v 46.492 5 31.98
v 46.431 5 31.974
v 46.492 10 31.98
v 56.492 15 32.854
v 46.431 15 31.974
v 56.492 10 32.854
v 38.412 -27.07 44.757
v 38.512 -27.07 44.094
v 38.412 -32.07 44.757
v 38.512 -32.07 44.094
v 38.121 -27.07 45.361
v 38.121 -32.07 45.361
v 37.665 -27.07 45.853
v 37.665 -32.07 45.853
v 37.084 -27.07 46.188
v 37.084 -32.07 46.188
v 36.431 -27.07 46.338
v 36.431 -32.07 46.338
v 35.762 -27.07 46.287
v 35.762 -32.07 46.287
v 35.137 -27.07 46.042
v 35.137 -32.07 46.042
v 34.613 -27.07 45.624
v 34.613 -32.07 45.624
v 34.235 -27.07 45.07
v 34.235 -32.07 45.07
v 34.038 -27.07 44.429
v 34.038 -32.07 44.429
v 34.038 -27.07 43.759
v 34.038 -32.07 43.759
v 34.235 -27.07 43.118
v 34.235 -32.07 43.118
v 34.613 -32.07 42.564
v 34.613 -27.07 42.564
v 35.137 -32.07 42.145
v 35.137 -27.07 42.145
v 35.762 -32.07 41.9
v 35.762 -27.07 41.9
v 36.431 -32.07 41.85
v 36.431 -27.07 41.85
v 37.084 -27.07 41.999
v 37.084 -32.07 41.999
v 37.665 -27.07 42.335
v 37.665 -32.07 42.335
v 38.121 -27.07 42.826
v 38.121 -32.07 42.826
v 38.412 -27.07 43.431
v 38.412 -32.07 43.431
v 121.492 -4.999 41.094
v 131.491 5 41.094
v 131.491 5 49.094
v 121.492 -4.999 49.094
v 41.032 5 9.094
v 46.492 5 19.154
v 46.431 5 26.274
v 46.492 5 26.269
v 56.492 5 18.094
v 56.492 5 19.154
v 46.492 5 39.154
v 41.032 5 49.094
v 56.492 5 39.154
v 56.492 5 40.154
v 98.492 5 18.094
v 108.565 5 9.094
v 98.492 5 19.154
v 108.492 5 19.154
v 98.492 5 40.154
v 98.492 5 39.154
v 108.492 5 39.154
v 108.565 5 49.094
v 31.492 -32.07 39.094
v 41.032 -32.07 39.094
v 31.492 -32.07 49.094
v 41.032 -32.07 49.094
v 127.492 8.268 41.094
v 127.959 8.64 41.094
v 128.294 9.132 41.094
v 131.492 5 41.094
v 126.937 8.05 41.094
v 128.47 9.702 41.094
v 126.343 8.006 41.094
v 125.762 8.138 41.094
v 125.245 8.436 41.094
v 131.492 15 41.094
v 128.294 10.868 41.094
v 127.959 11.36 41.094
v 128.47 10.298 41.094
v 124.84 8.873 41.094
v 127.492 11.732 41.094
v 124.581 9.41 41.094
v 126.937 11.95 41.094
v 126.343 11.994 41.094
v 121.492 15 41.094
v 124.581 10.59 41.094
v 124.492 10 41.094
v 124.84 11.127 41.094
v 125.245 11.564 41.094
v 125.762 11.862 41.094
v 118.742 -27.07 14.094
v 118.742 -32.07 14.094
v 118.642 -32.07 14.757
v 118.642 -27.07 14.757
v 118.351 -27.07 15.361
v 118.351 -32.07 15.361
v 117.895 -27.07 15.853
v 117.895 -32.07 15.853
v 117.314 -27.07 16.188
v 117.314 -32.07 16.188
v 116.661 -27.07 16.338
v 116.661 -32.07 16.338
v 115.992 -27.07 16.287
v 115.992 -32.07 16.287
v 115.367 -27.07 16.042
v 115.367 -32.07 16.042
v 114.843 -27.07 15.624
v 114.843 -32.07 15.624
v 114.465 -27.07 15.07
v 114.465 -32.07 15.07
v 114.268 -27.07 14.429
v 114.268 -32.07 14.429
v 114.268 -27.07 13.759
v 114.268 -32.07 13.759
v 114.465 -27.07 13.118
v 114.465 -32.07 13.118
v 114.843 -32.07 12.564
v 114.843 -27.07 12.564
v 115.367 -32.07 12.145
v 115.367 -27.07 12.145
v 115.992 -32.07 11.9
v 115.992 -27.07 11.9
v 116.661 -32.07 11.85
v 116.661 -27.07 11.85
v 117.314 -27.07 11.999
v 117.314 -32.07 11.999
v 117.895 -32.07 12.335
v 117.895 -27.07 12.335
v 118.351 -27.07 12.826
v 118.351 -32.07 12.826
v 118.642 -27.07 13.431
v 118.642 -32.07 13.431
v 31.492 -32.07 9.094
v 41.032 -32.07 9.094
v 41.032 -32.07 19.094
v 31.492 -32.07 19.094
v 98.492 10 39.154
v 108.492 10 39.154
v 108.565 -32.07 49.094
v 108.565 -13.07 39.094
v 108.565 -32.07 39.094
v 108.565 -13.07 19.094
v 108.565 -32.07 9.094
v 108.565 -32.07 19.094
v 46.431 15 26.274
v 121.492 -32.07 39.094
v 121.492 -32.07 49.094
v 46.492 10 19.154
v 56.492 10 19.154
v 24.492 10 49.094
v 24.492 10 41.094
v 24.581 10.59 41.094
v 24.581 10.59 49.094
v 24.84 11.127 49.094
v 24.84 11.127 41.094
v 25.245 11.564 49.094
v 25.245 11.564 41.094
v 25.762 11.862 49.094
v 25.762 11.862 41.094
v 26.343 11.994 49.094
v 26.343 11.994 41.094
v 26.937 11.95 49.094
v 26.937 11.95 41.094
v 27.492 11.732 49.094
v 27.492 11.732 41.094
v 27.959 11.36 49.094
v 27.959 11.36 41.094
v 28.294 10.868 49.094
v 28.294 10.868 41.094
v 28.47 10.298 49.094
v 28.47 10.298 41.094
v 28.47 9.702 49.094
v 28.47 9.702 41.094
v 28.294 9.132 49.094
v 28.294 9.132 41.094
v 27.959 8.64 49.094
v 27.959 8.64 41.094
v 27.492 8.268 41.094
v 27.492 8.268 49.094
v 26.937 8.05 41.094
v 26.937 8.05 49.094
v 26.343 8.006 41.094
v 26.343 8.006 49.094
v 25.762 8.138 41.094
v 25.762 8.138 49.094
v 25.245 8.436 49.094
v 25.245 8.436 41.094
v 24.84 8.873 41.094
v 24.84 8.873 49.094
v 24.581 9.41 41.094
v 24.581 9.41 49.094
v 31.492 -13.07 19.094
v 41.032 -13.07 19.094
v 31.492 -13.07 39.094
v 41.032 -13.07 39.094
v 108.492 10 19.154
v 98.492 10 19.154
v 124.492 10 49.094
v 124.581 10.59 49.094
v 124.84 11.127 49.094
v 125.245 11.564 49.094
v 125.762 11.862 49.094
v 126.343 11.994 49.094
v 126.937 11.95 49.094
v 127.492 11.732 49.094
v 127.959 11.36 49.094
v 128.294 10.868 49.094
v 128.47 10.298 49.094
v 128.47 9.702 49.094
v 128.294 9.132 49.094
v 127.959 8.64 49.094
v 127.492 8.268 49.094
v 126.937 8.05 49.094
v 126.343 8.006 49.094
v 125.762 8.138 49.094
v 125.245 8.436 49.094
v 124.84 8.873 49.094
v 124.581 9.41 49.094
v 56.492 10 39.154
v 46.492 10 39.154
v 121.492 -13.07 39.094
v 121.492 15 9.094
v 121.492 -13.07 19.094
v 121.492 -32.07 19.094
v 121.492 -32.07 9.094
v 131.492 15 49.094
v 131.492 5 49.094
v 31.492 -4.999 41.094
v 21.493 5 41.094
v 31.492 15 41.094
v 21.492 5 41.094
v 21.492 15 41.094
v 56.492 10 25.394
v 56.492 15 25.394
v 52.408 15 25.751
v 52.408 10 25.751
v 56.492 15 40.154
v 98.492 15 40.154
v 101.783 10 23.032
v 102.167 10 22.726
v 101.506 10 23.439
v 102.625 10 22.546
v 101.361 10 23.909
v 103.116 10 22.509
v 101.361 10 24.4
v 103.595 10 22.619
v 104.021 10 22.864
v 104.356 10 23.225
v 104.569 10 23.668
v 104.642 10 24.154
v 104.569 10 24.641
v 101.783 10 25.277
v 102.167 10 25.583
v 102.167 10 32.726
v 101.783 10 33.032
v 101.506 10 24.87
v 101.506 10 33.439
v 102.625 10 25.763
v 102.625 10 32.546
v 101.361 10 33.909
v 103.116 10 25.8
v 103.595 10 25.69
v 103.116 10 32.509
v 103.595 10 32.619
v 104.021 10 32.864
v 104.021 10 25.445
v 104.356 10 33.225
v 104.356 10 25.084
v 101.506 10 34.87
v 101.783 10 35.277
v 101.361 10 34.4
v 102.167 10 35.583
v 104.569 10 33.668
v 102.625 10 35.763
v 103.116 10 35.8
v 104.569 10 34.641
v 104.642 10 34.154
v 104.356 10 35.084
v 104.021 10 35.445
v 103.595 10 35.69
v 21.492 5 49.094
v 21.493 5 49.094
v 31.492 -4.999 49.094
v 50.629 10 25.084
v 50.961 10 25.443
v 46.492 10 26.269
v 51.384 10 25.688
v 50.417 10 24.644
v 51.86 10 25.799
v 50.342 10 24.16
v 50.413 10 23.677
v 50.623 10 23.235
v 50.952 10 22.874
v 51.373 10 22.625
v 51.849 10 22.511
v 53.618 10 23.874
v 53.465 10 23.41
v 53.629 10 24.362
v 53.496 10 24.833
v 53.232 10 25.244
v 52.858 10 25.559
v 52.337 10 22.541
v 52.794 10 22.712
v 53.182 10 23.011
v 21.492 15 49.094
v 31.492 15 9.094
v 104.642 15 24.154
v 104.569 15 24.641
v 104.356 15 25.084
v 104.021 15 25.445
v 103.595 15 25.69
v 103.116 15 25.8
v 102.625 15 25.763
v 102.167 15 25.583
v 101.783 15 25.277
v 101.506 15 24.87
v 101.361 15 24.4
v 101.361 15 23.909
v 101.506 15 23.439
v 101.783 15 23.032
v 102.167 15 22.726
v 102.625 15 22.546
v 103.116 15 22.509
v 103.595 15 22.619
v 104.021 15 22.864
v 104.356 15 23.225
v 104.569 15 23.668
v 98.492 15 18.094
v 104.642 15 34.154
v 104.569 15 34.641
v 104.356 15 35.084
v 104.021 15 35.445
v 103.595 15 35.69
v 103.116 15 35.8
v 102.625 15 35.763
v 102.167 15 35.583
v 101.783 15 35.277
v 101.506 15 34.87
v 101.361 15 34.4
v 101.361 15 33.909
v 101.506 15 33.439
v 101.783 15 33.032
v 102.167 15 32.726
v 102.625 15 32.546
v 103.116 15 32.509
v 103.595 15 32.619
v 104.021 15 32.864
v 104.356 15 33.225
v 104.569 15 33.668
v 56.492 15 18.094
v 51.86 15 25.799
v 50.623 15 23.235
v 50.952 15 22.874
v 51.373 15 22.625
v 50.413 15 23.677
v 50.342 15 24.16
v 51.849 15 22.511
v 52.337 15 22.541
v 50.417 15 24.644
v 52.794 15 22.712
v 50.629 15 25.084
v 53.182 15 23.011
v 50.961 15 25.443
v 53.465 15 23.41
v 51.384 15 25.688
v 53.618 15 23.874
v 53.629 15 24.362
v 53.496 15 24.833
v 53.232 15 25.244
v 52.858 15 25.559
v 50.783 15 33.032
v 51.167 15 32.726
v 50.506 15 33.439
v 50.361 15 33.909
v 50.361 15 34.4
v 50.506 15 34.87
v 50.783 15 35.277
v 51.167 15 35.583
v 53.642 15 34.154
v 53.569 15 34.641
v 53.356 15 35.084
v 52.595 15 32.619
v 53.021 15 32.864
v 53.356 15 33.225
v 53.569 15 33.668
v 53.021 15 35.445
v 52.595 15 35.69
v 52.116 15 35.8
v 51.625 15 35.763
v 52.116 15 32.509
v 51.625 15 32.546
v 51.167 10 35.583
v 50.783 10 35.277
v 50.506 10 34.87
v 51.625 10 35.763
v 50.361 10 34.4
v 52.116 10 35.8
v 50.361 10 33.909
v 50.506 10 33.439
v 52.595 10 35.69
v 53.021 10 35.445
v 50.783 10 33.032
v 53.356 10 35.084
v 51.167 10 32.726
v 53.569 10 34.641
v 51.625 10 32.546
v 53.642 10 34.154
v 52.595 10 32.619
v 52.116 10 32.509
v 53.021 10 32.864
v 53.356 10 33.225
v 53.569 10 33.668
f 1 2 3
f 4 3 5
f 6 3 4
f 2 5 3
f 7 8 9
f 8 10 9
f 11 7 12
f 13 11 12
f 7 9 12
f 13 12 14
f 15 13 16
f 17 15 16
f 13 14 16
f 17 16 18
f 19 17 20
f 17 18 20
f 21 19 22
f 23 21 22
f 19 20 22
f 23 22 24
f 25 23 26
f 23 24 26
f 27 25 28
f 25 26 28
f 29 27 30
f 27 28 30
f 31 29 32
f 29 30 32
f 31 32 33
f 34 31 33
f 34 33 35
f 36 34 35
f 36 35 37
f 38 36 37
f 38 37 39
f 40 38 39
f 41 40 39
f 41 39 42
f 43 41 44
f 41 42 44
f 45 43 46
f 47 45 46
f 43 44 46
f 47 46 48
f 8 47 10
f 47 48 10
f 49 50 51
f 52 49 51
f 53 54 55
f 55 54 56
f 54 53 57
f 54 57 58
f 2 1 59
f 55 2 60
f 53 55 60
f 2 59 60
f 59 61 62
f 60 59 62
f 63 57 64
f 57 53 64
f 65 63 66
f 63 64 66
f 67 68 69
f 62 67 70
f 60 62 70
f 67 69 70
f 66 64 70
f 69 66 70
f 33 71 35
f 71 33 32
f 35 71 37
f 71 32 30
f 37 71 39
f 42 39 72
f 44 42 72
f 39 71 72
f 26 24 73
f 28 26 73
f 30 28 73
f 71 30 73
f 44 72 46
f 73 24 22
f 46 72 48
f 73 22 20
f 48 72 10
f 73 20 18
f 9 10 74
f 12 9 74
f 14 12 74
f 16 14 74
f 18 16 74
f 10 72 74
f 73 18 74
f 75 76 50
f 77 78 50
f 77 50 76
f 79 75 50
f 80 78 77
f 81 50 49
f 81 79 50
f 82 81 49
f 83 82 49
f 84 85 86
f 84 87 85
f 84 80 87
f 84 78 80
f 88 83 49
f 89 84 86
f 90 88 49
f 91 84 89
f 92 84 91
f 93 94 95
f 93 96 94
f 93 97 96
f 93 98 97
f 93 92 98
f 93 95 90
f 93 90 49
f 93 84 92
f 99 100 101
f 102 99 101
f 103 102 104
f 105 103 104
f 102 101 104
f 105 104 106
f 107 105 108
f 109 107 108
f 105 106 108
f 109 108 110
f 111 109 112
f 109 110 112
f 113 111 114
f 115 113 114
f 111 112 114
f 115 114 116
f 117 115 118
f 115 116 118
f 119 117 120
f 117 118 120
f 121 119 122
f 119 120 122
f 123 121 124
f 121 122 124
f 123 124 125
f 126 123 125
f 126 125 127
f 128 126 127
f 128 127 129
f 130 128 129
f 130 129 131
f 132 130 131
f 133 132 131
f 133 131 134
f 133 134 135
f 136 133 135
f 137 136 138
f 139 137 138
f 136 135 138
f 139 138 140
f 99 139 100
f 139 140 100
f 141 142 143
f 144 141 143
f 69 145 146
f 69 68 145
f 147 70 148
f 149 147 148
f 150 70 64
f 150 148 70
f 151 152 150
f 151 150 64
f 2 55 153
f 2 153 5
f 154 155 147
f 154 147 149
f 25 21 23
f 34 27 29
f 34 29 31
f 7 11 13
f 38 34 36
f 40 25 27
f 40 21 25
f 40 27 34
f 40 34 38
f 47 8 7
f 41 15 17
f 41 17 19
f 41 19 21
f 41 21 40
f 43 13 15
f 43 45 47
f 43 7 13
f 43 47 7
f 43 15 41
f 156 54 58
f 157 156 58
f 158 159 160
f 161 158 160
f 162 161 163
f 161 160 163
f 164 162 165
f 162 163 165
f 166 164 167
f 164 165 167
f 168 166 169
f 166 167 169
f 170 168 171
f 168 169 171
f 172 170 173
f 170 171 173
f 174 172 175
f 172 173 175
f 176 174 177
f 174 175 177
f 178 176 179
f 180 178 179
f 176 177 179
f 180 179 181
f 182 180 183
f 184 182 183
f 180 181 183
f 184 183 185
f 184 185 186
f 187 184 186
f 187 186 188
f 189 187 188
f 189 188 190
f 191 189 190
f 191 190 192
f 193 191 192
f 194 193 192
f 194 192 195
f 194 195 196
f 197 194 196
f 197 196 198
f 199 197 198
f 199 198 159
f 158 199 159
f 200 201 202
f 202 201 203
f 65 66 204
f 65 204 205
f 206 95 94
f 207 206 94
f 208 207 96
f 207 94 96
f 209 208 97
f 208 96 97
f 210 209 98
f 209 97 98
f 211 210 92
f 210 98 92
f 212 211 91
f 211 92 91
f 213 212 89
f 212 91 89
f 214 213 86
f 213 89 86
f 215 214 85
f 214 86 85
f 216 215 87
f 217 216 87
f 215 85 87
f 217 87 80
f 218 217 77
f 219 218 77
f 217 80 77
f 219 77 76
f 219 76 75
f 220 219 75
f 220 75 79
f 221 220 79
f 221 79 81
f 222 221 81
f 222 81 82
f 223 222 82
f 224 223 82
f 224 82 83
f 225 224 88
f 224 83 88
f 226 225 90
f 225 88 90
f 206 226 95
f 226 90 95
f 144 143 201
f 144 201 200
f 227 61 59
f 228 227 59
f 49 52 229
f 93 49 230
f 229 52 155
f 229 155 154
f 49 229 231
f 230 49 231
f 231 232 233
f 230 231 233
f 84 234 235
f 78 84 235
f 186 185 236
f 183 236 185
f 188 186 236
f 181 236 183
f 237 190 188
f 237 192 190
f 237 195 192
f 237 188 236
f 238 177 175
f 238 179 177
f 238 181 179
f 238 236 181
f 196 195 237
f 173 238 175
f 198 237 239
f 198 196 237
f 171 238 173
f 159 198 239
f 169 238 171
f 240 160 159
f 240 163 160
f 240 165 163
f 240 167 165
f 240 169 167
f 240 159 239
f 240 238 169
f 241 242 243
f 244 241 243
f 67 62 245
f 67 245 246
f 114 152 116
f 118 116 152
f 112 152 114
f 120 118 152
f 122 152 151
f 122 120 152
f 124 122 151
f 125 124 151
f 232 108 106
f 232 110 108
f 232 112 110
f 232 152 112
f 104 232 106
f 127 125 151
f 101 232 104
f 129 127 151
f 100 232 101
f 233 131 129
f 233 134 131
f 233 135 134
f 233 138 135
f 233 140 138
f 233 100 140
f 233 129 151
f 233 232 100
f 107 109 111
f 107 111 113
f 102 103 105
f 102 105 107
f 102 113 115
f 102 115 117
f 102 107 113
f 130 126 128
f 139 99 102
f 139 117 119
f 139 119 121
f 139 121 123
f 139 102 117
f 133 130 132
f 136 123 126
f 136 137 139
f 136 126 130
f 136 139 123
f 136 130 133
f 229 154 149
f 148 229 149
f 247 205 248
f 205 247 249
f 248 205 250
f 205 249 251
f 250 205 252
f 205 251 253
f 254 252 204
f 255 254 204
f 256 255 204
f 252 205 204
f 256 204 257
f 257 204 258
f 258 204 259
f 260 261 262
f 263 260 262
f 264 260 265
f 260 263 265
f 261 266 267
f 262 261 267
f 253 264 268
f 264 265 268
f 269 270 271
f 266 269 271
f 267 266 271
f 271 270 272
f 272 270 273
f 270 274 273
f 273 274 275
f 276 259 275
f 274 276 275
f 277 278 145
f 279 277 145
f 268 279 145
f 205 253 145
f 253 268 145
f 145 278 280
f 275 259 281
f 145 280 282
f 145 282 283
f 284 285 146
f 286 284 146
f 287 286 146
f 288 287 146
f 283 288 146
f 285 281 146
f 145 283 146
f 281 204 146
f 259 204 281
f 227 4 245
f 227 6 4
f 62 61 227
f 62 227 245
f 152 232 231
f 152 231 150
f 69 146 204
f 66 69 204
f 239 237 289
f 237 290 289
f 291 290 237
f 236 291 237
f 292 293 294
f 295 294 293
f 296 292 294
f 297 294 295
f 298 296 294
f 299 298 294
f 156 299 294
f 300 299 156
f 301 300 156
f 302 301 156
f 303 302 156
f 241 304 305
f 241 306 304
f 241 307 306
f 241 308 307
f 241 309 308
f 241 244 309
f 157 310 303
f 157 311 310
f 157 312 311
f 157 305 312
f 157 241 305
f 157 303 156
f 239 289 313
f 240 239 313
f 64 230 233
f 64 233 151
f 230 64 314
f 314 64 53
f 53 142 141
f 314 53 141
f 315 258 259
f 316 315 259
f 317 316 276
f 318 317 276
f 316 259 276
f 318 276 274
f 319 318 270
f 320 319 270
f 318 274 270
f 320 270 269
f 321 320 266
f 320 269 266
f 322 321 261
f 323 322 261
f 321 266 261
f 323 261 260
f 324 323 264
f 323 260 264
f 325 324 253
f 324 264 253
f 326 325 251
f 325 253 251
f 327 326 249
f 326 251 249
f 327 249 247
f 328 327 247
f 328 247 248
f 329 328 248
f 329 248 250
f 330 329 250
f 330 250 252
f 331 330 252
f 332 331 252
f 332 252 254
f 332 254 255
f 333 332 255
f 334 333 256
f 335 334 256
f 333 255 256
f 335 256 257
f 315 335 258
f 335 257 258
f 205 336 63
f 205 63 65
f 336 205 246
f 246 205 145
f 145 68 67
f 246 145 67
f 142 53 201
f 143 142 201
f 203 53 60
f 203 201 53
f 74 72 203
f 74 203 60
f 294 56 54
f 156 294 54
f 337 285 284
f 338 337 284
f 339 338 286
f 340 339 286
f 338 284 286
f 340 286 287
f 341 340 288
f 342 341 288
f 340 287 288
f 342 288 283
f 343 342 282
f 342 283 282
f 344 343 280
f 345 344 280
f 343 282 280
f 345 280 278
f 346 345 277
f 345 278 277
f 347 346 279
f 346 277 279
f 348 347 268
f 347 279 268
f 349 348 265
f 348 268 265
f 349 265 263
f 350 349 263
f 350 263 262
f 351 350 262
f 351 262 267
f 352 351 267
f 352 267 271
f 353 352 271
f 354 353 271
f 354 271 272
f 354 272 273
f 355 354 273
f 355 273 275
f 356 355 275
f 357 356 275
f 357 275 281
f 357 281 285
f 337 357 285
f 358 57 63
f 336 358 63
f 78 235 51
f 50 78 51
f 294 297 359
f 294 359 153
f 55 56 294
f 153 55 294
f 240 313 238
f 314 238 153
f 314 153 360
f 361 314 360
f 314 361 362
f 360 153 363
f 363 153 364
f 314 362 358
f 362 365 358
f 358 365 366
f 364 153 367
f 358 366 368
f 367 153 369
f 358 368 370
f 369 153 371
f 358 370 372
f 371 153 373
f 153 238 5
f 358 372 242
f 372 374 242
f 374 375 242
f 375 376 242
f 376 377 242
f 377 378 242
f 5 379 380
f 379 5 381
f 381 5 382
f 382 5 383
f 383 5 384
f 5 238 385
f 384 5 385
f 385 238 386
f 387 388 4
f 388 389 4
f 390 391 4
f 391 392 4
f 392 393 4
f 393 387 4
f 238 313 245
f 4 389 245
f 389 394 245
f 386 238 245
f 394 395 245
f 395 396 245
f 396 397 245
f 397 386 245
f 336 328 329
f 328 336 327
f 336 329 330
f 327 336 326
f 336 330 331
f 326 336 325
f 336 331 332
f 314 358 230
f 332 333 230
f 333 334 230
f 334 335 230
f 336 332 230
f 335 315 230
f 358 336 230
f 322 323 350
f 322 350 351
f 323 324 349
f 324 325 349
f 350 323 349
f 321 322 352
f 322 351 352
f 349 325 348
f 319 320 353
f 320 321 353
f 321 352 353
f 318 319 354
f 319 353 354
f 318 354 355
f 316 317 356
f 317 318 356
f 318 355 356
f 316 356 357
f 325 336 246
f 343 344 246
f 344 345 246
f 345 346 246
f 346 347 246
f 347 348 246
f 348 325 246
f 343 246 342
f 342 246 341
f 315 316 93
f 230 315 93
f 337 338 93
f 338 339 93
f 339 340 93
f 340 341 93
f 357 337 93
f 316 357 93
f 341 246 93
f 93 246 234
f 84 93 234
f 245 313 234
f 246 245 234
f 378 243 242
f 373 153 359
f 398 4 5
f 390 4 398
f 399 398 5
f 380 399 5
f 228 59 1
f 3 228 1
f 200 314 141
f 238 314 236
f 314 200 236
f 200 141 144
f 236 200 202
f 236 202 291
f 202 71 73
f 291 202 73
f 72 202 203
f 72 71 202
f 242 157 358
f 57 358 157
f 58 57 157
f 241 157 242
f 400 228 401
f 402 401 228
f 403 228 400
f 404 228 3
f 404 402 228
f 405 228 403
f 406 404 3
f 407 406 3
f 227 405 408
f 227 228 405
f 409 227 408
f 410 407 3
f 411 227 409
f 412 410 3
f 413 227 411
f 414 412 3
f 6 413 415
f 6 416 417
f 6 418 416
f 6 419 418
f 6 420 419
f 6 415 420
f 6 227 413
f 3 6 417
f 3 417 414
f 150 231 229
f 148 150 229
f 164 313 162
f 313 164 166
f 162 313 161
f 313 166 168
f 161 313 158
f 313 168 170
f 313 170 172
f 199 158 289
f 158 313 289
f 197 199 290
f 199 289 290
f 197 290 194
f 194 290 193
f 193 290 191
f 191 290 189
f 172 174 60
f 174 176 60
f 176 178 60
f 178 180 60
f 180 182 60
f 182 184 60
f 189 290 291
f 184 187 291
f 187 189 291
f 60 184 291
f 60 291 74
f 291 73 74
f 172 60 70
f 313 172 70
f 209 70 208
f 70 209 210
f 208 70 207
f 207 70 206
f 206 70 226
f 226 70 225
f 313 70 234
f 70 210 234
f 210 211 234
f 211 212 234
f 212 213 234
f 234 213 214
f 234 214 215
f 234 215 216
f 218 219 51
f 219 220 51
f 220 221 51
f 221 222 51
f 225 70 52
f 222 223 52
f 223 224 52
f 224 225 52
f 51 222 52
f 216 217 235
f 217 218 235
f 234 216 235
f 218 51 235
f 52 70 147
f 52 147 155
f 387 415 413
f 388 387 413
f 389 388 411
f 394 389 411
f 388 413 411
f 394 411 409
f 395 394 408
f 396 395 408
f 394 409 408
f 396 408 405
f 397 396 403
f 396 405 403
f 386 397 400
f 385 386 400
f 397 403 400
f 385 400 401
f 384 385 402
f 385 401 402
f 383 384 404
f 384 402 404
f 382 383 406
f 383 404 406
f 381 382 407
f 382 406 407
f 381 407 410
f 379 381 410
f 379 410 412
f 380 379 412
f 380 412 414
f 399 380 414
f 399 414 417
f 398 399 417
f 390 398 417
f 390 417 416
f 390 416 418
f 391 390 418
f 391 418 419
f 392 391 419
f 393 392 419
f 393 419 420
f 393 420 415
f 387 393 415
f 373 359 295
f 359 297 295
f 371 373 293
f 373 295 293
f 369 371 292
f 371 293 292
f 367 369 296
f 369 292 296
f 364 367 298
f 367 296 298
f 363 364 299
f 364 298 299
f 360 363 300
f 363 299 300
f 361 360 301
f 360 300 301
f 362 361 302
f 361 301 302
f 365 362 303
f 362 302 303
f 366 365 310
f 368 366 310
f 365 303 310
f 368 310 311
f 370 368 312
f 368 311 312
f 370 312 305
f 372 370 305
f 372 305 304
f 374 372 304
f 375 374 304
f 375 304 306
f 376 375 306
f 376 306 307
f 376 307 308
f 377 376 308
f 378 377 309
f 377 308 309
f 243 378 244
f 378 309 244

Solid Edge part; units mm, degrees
sketch "Sketch1" plane through (0, 0, 0) normal (0, -1, 0) x (1, 0, 0)
  line L0 (31.4924, 49.0939) -> (121.4924, 49.0939)
  line L1 (121.4924, 49.0939) -> (121.4924, 9.0939)
  line L2 (121.4924, 9.0939) -> (31.4924, 9.0939)
  line L3 (31.4924, 9.0939) -> (31.4924, 49.0939)
  dimension "D1" = 90
  dimension "D2" = 40
extrude "Protrusion1" add sketch "Sketch1" against normal blind 40
sketch "Sketch2" plane through (64.4924, 0, 22.0939) normal (0, -1, 0) x (1, 0, 0)
  line L0 (-18.0616, 9.8803) -> (-8, 10.7605)
  line L1 (-8, 10.7605) -> (-8, 18.0605)
  line L2 (-8, 18.0605) -> (34, 18.0605)
  line L3 (34, -4) -> (34, 18.0605)
  line L4 (-8, -4) -> (34, -4)
  line L5 (-8, -4) -> (-8, 3.3)
  line L6 (-8, 3.3) -> (-18.0616, 4.1803)
  line L7 (-18.0616, 4.1803) -> (-18.0616, 9.8803)
extrude "ExtrudedCutout_4" cut sketch "Sketch2" against normal blind 37
sketch "Sketch3" plane through (31.4924, 20, 22.0939) normal (-1, 0, 0) x (0, -1, 0)
  line L0 (-17, 2) -> (-17, 12)
  line L1 (-17, 12) -> (-10, 12)
  line L2 (-10, 12) -> (-10, 2)
  line L3 (-10, 2) -> (-17, 2)
  dimension "D1" = 10
  dimension "D2" = 7
  dimension "D3" = 10
  dimension "D4" = 3
  dimension "D5" = 15
extrude "Cutout1" cut sketch "Sketch3" against normal up to next
sketch "Sketch4" plane through (64.4924, 0, 22.0939) normal (0, -1, 0) x (1, 0, 0)
  line L0 (-8, 17.0605) -> (-18, 17.0605)
  line L1 (-18, 17.0605) -> (-18, -2.9395)
  line L2 (-18, -2.9395) -> (-8, -2.9395)
  line L3 (-8, -2.9395) -> (-8, 17.0605)
  line L4 (34, 17.0605) -> (44, 17.0605)
  line L5 (44, 17.0605) -> (44, -2.9395)
  line L6 (44, -2.9395) -> (34, -2.9395)
  line L7 (34, -2.9395) -> (34, 17.0605)
  dimension "D1" = 1
  dimension "D2" = 20
  dimension "D3" = 1
  dimension "D4" = 10
  dimension "D5" = 20
  dimension "D6" = 10
extrude "ExtrudedCutout_6" cut sketch "Sketch4" against normal blind 10
sketch "Sketch5" plane through (91.2324, 10, 21.645) normal (0, -1, 0) x (1, 0, 0)
  circle A0 centre (11.76, 12.5095) radius 1.65
  circle A1 centre (-39.24, 12.5095) radius 1.65
  circle A2 centre (-39.24, 2.5095) radius 1.65
  circle A3 centre (11.76, 2.5095) radius 1.65
  dimension "D1" = 4.5
  dimension "D2" = 3.3
  dimension "D3" = 4.5
  dimension "D4" = 10
  dimension "D5" = 5
  dimension "D6" = 10
  dimension "D7" = 5
extrude "Cutout2" cut sketch "Sketch5" against normal through all
sketch "Sketch6" plane through (68.9924, 0, 22.0939) normal (0, -1, 0) x (1, 0, 0)
  line L0 (-37.5, 27) -> (-37.5, -13)
  line L1 (-37.5, -13) -> (52.5, -13)
  line L2 (52.5, -13) -> (52.5, 27)
  line L3 (52.5, 27) -> (-37.5, 27)
  line L4 (-22.5616, 13.0605) -> (-22.5616, 18.0605)
  line L5 (-22.5616, 18.0605) -> (39.5, 18.0605)
  line L6 (39.5, 18.0605) -> (39.5, -4)
  line L7 (39.5, -4) -> (-22.5616, -4)
  line L8 (-22.5616, 13.0605) -> (-22.5616, -4)
extrude "ExtrudedProtrusion_4" add sketch "Sketch6" along normal blind 28.07
sketch "Sketch7" plane through (68.9924, -28.07, 22.0939) normal (0, -1, 0) x (1, 0, 0)
  circle A0 centre (-4.46, 7) radius 23.5
  dimension "D1" = 33.04
  dimension "D2" = 47
extrude "ExtrudedCutout_9" cut sketch "Sketch7" against normal blind 33.07
sketch "Sketch8" plane through (41.8429, -28.07, 29.0939) normal (0, -1, 0) x (0, 0, 1)
  line L0 (0, 10.3505) -> (5, 10.3505)
  line L1 (5, 10.3505) -> (5, -79.6495)
  line L2 (5, -79.6495) -> (0, -79.6495)
  line L3 (0, -79.6495) -> (-5, -79.6495)
  line L4 (-5, -79.6495) -> (-5, 10.3505)
  line L5 (-5, 10.3505) -> (0, 10.3505)
  dimension "D1" = 5
  dimension "D2" = 5
extrude "Cutout3" cut sketch "Sketch8" against normal blind 15
sketch "Sketch9" plane through (76.4924, 5.965, 49.0939) normal (0, 0, 1) x (-1, 0, 0)
  line L0 (-0.379, 0.965) -> (24.299, 0.965)
  line L1 (24.299, 0.965) -> (45, 0.965)
  line L2 (45, 0.965) -> (55, 0.965)
  line L3 (55, 0.965) -> (55, -9.035)
  line L4 (55, -9.035) -> (45, -9.035)
  line L5 (45, -9.035) -> (-45, -9.035)
  line L6 (-45, -9.035) -> (-55, -9.035)
  line L7 (-55, -9.035) -> (-55, 0.965)
  line L8 (-55, 0.965) -> (-45, 0.965)
  line L9 (-45, 0.965) -> (-0.379, 0.965)
  dimension "D1" = 10
  dimension "D2" = 10
  dimension "D3" = 10
  dimension "D4" = 10
extrude "ExtrudedProtrusion_9" add sketch "Sketch9" against normal blind 8
sketch "Sketch10" plane through (26.4924, 10, 41.0939) normal (0, 0, -1) x (-1, 0, 0)
  circle A0 centre (0, 0) radius 2
  circle A1 centre (-100, 0) radius 2
  dimension "D1" = 4
  dimension "D2" = 5
  dimension "D3" = 5
  dimension "D4" = 4
  dimension "D5" = 5
  dimension "D6" = 5
extrude "Cutout4" cut sketch "Sketch10" against normal through all
chamfer "Chamfer_1" distance 10 angle 45 1 edges at (31.4924, 15, 45.0939)
chamfer "Chamfer_2" distance 10 angle 45 1 edges at (31.4924, 5, 45.0939)
chamfer "Chamfer_3" distance 10 angle 45 1 edges at (121.4924, 15, 45.0939)
chamfer "Chamfer_4" distance 10 angle 45 1 edges at (121.4924, 5, 45.0939)
sketch "Sketch11" plane through (76.4924, 5.965, 49.0939) normal (0, 0, 1) x (1, 0, 0)
  line L0 (-55, 9.035) -> (55, 9.035)
  line L1 (55, 9.035) -> (45, 34.035)
  line L2 (45, 34.035) -> (-45, 34.035)
  line L3 (-45, 34.035) -> (-55, 9.035)
extrude "Cutout5" cut sketch "Sketch11" against normal through all
sketch "Sketch12" plane through (99.1819, -28.07, 41.5939) normal (0, -1, 0) x (1, 0, 0)
  line L0 (-58.1495, -12.5) -> (-58.1495, 7.5)
  line L1 (-58.1495, 7.5) -> (0, 7.5)
  line L2 (0, 7.5) -> (9.3829, 7.5)
  line L3 (9.3829, 7.5) -> (9.3829, -32.5)
  line L4 (-58.1495, -32.5) -> (9.3829, -32.5)
  line L5 (-58.1495, -12.5) -> (-58.1495, -32.5)
extrude "Cutout6" cut sketch "Sketch12" against normal up to vertex (33.07 mm away)
sketch "Sketch13" plane through (36.2624, -28.07, 41.5939) normal (0, -1, 0) x (0, 0, -1)
  line L0 (2.5, -4.77) -> (2.5, 4.77)
  line L1 (2.5, 4.77) -> (7.5, 4.77)
  line L2 (7.5, 4.77) -> (7.5, -4.77)
  line L3 (7.5, -4.77) -> (2.5, -4.77)
extrude "Cutout7" cut sketch "Sketch13" against normal up to vertex (15 mm away)
sketch "Sketch14" plane through (36.2624, -28.07, 41.5939) normal (0, -1, 0) x (0, 0, -1)
  line L0 (22.5, 4.77) -> (22.5, -4.77)
  line L1 (22.5, -4.77) -> (17.5, -4.77)
  line L2 (17.5, -4.77) -> (17.5, 4.77)
  line L3 (17.5, 4.77) -> (22.5, 4.77)
extrude "Cutout8" cut sketch "Sketch14" against normal up to vertex (15 mm away)
sketch "Sketch15" plane through (36.2624, -28.07, 41.5939) normal (0, -1, 0) x (0, 0, -1)
  line L0 (2.5, 85.23) -> (7.5, 85.23)
  line L1 (7.5, 85.23) -> (7.5, 72.3024)
  line L2 (2.5, 72.3024) -> (7.5, 72.3024)
  line L3 (2.5, 85.23) -> (2.5, 72.3024)
extrude "Cutout9" cut sketch "Sketch15" against normal up to vertex (15 mm away)
sketch "Sketch16" plane through (36.2624, -28.07, 41.5939) normal (0, -1, 0) x (0, 0, -1)
  line L0 (22.5, 85.23) -> (22.5, 72.3024)
  line L1 (22.5, 72.3024) -> (17.5, 72.3024)
  line L2 (17.5, 72.3024) -> (17.5, 85.23)
  line L3 (17.5, 85.23) -> (22.5, 85.23)
extrude "Cutout10" cut sketch "Sketch16" against normal up to vertex (15 mm away)
sketch "Sketch17" plane through (36.2624, -28.07, 44.0939) normal (0, -1, 0) x (1, 0, 0)
  line L0 (4.77, 5) -> (4.77, -5)
  line L1 (4.77, -5) -> (-4.77, -5)
  line L2 (-4.77, -5) -> (-4.77, 5)
  line L3 (-4.77, 5) -> (4.77, 5)
extrude "ExtrudedProtrusion_10" add sketch "Sketch17" along normal blind 4
sketch "Sketch18" plane through (36.2624, -28.07, 14.0939) normal (0, -1, 0) x (1, 0, 0)
  line L0 (85.23, 25) -> (85.23, 35)
  line L1 (85.23, 35) -> (72.3024, 35)
  line L2 (72.3024, 35) -> (72.3024, 25)
  line L3 (72.3024, 25) -> (85.23, 25)
extrude "Protrusion2" add sketch "Sketch18" along normal blind 4
sketch "Sketch19" plane through (36.2624, -28.07, 14.0939) normal (0, -1, 0) x (1, 0, 0)
  line L0 (72.3024, 5) -> (72.3024, -5)
  line L1 (72.3024, -5) -> (85.23, -5)
  line L2 (85.23, 5) -> (85.23, -5)
  line L3 (72.3024, 5) -> (85.23, 5)
extrude "Protrusion3" add sketch "Sketch19" along normal blind 4
sketch "Sketch20" plane through (36.2624, -28.07, 14.0939) normal (0, -1, 0) x (1, 0, 0)
  line L0 (-4.77, -5) -> (-4.77, 5)
  line L1 (-4.77, 5) -> (4.77, 5)
  line L2 (4.77, 5) -> (4.77, -5)
  line L3 (4.77, -5) -> (-4.77, -5)
extrude "Protrusion4" add sketch "Sketch20" along normal blind 4
sketch "Sketch21" plane through (36.2624, -32.07, 44.0939) normal (0, -1, 0) x (1, 0, 0)
  circle A0 centre (0, 0) radius 2.25
  dimension "D1" = 4.5
  dimension "D2" = 4.77
  dimension "D3" = 5
extrude "Cutout11" cut sketch "Sketch21" against normal blind 5
sketch "Sketch22" plane through (115.0286, -32.07, 14.0939) normal (0, -1, 0) x (1, 0, 0)
  circle A0 centre (1.4638, 0) radius 2.25
  dimension "D1" = 4.5
  dimension "D2" = 5
  dimension "D3" = 5
extrude "Cutout12" cut sketch "Sketch22" against normal blind 5
